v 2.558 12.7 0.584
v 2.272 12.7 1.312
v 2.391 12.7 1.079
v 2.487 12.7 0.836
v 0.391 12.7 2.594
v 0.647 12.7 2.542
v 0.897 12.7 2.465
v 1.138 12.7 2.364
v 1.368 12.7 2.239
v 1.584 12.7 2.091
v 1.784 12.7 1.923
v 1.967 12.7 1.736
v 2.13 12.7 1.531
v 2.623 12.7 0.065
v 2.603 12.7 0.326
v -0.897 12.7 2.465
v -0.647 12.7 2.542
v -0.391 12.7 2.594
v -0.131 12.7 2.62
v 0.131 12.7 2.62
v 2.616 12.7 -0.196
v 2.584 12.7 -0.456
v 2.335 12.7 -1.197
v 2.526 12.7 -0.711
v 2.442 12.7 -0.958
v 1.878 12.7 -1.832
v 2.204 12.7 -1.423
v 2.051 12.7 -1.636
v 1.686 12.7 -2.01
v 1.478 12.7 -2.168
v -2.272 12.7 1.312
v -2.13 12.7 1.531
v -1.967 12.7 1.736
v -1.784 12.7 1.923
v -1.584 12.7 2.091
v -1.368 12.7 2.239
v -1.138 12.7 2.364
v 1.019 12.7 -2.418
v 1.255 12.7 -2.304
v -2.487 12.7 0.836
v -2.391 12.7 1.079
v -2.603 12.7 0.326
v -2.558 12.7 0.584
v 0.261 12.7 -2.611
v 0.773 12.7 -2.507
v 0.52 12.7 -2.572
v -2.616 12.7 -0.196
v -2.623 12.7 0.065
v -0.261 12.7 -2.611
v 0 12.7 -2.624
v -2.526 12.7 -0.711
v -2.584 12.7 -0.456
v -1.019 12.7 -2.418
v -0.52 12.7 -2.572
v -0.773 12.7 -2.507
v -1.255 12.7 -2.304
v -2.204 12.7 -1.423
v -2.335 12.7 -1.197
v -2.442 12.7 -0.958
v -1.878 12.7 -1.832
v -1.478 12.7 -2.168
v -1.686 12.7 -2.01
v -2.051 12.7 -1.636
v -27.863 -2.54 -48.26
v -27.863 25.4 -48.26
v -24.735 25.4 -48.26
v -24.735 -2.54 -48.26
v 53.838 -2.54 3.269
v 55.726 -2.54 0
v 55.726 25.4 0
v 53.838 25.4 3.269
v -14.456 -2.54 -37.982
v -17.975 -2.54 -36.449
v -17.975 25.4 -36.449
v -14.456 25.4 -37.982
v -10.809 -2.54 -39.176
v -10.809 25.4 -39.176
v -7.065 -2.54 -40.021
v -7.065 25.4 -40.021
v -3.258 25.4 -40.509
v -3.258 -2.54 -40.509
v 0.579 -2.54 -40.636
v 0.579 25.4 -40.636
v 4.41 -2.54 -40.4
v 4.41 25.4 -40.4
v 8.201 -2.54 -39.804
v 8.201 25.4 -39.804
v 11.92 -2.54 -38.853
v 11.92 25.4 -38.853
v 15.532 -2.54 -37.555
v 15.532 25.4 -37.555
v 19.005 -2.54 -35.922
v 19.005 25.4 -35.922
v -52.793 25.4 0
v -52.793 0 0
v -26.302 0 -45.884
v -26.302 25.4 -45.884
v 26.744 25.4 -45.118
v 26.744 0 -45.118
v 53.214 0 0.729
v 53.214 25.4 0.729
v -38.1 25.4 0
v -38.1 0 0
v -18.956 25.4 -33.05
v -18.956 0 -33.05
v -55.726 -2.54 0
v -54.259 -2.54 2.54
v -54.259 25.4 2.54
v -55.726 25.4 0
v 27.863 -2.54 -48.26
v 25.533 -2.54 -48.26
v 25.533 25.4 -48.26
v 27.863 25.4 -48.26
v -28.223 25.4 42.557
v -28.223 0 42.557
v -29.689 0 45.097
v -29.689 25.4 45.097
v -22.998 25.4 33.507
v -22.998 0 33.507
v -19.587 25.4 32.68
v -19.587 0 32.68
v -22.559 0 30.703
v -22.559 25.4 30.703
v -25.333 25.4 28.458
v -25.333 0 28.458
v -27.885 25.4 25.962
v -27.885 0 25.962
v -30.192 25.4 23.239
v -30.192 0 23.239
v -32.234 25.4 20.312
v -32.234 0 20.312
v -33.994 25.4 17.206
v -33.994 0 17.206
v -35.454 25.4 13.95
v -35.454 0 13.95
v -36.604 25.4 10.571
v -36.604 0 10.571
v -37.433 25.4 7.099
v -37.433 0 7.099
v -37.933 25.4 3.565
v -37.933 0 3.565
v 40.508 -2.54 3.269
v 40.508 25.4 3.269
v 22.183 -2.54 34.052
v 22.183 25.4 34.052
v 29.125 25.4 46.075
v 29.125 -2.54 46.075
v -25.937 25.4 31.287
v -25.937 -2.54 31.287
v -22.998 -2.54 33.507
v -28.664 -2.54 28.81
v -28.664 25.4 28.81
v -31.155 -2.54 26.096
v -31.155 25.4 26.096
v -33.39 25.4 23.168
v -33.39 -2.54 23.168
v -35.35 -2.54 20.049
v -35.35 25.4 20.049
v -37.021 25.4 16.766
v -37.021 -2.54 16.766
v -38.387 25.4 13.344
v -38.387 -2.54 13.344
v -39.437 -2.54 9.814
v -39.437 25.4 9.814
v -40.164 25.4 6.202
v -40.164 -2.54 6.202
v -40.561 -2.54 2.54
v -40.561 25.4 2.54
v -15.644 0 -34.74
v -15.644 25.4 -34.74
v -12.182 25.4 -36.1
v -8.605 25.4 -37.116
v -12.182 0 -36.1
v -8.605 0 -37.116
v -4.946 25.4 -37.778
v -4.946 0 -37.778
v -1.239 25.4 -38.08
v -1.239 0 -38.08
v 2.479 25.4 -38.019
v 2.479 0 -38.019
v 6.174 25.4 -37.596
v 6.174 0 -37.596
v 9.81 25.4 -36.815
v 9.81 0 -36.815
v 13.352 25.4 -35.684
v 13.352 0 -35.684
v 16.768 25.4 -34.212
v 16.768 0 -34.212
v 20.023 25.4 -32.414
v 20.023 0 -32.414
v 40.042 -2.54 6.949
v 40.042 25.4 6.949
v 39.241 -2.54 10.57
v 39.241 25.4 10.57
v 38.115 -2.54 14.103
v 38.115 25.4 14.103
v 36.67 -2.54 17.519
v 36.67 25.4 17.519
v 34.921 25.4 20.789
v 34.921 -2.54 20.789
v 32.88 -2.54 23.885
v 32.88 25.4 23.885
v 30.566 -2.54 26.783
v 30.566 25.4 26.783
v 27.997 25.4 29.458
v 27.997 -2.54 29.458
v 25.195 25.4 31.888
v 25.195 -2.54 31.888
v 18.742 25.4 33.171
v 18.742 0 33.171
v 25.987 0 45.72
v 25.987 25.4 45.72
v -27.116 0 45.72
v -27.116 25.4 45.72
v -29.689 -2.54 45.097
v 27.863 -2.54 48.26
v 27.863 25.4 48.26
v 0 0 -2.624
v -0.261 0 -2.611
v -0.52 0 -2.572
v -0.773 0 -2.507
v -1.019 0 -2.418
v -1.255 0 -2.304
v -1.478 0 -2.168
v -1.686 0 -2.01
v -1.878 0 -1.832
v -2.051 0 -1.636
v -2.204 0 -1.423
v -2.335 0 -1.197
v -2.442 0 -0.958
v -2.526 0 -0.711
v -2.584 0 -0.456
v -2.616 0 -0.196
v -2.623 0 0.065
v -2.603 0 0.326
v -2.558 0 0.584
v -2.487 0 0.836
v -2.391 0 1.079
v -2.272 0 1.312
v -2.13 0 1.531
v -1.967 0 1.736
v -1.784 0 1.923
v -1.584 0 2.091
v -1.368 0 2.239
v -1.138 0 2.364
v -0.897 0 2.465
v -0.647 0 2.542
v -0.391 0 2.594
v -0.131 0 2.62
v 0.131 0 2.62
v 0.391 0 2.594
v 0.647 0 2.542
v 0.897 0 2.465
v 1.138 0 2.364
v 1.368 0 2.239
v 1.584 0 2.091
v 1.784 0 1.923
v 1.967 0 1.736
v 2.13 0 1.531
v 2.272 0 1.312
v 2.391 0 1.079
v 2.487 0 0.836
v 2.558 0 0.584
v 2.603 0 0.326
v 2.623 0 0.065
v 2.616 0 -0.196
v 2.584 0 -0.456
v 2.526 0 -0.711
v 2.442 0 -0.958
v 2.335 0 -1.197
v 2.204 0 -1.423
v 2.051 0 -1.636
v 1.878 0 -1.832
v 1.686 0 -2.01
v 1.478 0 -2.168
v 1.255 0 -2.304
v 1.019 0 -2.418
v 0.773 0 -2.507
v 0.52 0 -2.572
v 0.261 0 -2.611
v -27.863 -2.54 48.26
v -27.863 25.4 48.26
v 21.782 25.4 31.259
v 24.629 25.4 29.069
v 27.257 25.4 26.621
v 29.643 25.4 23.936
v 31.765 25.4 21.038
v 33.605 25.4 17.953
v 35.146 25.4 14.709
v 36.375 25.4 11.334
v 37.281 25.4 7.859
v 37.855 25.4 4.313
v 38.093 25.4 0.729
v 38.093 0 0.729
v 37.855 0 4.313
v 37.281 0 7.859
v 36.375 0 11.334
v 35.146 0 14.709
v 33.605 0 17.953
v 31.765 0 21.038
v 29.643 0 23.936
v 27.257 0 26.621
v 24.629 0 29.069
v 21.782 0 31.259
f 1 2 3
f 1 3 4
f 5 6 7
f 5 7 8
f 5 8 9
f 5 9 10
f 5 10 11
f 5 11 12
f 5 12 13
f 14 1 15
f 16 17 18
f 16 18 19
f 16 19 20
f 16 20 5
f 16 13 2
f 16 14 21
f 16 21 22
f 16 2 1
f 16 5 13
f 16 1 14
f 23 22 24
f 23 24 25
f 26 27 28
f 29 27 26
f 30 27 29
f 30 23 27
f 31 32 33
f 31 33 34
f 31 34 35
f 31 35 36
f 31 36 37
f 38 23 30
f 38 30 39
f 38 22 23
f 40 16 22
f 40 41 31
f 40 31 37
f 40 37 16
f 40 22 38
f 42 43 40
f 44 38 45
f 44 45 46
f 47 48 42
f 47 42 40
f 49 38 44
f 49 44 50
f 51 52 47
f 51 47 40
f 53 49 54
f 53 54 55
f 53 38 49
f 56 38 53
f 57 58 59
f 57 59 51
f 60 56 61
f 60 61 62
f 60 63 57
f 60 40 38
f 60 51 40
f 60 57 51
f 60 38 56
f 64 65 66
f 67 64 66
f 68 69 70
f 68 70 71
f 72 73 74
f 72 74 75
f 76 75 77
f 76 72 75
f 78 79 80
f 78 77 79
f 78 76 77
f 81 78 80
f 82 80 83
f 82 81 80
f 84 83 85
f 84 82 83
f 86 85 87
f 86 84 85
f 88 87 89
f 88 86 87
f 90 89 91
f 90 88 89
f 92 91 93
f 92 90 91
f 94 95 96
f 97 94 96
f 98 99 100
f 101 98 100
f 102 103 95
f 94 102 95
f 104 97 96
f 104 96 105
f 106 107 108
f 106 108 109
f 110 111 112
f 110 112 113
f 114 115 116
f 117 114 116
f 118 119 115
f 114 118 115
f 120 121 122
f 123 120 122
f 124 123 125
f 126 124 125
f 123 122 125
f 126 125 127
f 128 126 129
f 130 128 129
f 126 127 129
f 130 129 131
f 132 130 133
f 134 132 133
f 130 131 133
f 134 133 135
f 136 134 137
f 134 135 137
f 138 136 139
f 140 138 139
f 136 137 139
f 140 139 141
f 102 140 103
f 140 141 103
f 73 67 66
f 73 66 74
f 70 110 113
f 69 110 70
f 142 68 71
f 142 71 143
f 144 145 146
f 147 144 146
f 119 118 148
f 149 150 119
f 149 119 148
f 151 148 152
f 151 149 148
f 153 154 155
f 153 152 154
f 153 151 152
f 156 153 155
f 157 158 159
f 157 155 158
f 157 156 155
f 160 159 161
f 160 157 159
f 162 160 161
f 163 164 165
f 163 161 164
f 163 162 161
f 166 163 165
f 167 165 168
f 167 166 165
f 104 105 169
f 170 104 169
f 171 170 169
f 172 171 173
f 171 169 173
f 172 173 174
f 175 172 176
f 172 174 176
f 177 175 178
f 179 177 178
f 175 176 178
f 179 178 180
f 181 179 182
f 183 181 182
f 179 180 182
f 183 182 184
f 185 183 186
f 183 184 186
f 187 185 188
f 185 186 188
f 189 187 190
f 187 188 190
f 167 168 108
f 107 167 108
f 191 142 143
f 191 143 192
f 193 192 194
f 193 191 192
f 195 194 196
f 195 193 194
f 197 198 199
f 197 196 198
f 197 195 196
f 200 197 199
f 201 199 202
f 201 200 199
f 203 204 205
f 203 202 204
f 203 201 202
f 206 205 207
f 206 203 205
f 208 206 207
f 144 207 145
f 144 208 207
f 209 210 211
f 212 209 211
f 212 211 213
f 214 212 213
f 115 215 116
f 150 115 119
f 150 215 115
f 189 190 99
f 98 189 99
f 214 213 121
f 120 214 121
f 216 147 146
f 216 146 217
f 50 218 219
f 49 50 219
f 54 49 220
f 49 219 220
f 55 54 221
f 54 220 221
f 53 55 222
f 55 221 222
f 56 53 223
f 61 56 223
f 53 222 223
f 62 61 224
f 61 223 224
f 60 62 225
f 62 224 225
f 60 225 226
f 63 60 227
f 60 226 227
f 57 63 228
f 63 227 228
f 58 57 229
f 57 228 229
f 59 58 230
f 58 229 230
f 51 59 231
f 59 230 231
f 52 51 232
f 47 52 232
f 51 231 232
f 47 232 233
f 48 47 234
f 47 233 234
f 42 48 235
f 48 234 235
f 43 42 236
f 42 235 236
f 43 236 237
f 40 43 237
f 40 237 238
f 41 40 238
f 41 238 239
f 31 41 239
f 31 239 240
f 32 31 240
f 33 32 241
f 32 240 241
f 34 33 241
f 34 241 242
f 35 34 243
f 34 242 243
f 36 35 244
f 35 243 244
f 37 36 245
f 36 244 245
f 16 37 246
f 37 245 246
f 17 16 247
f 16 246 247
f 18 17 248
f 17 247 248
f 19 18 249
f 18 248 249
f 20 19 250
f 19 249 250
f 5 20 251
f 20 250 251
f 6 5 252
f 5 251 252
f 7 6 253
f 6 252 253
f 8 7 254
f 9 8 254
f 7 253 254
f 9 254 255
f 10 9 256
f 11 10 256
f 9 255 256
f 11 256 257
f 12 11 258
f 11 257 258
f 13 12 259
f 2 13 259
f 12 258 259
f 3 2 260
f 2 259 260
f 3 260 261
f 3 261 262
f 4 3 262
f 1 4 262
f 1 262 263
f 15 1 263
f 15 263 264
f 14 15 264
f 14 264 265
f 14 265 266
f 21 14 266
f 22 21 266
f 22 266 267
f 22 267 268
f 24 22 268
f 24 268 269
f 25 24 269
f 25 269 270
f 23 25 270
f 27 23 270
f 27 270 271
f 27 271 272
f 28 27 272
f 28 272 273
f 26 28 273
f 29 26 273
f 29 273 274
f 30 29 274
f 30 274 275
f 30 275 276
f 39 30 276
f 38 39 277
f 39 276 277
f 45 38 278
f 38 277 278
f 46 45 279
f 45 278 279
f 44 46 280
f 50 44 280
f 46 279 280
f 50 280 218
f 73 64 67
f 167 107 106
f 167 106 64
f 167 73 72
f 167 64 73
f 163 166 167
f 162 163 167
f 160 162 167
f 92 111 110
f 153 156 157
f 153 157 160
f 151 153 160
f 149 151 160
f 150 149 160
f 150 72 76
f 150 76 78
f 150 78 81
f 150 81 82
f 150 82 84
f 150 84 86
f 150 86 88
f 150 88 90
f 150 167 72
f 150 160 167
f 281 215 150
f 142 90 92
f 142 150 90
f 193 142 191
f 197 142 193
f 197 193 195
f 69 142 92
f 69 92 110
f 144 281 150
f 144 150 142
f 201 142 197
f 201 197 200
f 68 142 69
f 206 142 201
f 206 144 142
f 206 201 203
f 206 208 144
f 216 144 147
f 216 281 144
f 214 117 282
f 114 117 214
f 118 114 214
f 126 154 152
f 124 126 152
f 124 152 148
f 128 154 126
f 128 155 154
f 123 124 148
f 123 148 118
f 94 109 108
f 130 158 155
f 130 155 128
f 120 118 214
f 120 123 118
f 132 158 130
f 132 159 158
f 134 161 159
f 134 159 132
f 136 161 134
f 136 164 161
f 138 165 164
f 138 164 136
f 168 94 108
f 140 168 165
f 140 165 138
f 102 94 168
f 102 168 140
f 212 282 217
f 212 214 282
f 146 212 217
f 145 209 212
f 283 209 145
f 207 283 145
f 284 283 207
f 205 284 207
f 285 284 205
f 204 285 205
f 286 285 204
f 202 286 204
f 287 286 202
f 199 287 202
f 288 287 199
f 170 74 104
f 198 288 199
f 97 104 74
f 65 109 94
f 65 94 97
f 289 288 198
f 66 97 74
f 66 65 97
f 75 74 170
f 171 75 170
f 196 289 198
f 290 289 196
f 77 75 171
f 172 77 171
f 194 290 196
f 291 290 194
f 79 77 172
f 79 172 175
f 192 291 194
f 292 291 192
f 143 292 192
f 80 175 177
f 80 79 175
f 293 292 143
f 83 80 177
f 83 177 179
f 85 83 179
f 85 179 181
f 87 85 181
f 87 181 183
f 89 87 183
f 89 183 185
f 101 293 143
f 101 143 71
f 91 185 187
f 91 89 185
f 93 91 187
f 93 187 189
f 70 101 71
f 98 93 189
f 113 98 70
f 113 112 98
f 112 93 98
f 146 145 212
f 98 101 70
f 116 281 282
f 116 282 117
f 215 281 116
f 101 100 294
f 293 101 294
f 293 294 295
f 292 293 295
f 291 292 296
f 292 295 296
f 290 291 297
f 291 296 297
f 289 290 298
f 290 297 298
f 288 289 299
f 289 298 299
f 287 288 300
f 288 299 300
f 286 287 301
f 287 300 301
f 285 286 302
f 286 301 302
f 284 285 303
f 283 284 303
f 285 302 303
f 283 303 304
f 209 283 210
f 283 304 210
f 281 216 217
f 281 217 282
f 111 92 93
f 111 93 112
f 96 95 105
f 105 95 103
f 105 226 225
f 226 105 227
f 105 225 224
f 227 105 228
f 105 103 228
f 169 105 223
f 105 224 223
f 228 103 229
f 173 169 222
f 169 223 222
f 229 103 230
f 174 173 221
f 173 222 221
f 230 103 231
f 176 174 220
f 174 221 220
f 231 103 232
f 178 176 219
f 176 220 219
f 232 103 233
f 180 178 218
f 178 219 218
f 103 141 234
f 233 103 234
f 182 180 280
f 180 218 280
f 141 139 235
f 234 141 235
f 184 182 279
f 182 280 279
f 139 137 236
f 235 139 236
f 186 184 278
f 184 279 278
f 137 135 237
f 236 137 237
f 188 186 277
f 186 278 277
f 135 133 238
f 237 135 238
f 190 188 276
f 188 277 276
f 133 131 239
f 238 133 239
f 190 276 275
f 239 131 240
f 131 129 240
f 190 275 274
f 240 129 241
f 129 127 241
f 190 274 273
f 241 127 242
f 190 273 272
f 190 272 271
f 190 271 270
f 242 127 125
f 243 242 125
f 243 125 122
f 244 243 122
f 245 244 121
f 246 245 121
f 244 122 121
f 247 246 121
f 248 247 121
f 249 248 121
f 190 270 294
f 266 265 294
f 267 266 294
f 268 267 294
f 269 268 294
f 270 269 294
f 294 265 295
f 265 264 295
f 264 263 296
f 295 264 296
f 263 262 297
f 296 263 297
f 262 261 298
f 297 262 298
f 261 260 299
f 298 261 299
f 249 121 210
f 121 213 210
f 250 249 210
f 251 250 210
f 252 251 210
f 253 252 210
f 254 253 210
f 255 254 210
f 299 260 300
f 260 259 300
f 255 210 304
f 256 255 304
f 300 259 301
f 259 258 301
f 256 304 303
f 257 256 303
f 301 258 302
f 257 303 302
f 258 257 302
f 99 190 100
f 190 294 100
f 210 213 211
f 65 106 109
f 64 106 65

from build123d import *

# Parameters (mm, degrees)
EXTRUDE_2_DEPTH = 25.4
EXTRUDE_START   = 2.54
EXTRUDE_4_DEPTH = 2.54
SKETCH_4_R      = 2.623574207
EXTRUDE_5_DEPTH = 12.7


with BuildPart() as part:
    # 草图2 → 凸台-拉伸2 (new body)
    with BuildSketch(Plane(origin=(0, 0, 0), x_dir=(1, 0, 0), z_dir=(0, 1, 0))):
        with BuildLine():
            Line((27.862923991, 48.26), (25.533011104, 48.26))
            Line((25.533011104, 48.26), (19.005421019, 35.922187738))
            ThreePointArc((19.005421019, 35.922187738), (0.578570421, 40.635881389), (-17.97500995, 36.448712149))
            Line((-17.97500995, 36.448712149), (-24.735061671, 48.26))
            Line((-24.735061671, 48.26), (-27.862923991, 48.26))
            Line((-27.862923991, 48.26), (-55.725847982, 0))
            Line((-55.725847982, 0), (-54.259378298, -2.54))
            Line((-54.259378298, -2.54), (-40.560547334, -2.54))
            ThreePointArc((-40.560547334, -2.54), (-35.350417354, -20.048880091), (-22.997765154, -33.50690075))
            Line((-22.997765154, -33.50690075), (-28.222727801, -42.556801521))
            Line((-28.222727801, -42.556801521), (-29.689197484, -45.096801521))
            Line((-29.689197484, -45.096801521), (-27.862923991, -48.26))
            Line((-27.862923991, -48.26), (27.862923991, -48.26))
            Line((27.862923991, -48.26), (29.124677573, -46.07457869))
            Line((29.124677573, -46.07457869), (22.183228773, -34.051636689))
            ThreePointArc((22.183228773, -34.051636689), (34.920508786, -20.78864272), (40.508274586, -3.269447975))
            Line((40.508274586, -3.269447975), (53.838231313, -3.269447975))
            Line((53.838231313, -3.269447975), (55.725847982, 0))
            Line((55.725847982, 0), (27.862923991, 48.26))
        make_face()
        with BuildLine():
            Line((-26.301774892, 45.883989559), (-18.95614877, 33.049575244))
            ThreePointArc((-18.95614877, 33.049575244), (0.620872136, 38.094940842), (20.02308022, 32.414290961))
            Line((20.02308022, 32.414290961), (26.744142761, 45.117785934))
            Line((26.744142761, 45.117785934), (53.2140556, -0.729447975))
            Line((53.2140556, -0.729447975), (38.093016495, -0.729447975))
            ThreePointArc((38.093016495, -0.729447975), (32.721218848, -19.517475172), (18.742100855, -33.171428301))
            Line((18.742100855, -33.171428301), (25.987022104, -45.72))
            Line((25.987022104, -45.72), (-27.116061926, -45.72))
            Line((-27.116061926, -45.72), (-19.587157143, -32.679554389))
            ThreePointArc((-19.587157143, -32.679554389), (-33.150269133, -18.779500963), (-38.1, 0))
            Line((-38.1, 0), (-52.792908615, 0))
            Line((-52.792908615, 0), (-26.301774892, 45.883989559))
        make_face(mode=Mode.SUBTRACT)
    extrude(amount=EXTRUDE_2_DEPTH)

    # 草图3 → 凸台-拉伸4 (add)
    with BuildSketch(Plane.XZ.offset(EXTRUDE_START)):
        with BuildLine():
            Line((22.183228773, 34.051636689), (29.124677573, 46.07457869))
            Line((29.124677573, 46.07457869), (27.862923991, 48.26))
            Line((27.862923991, 48.26), (-27.862923991, 48.26))
            Line((-27.862923991, 48.26), (-29.689197484, 45.096801521))
            Line((-29.689197484, 45.096801521), (-22.997765154, 33.50690075))
            ThreePointArc((-22.997765154, 33.50690075), (-35.350417354, 20.048880091), (-40.560547334, 2.54))
            Line((-40.560547334, 2.54), (-54.259378298, 2.54))
            Line((-54.259378298, 2.54), (-55.725847982, 0))
            Line((-55.725847982, 0), (-27.862923991, -48.26))
            Line((-27.862923991, -48.26), (-24.735061671, -48.26))
            Line((-24.735061671, -48.26), (-17.97500995, -36.448712149))
            ThreePointArc((-17.97500995, -36.448712149), (0.578570421, -40.635881389), (19.005421019, -35.922187738))
            Line((19.005421019, -35.922187738), (25.533011104, -48.26))
            Line((25.533011104, -48.26), (27.862923991, -48.26))
            Line((27.862923991, -48.26), (55.725847982, 0))
            Line((55.725847982, 0), (53.838231313, 3.269447975))
            Line((53.838231313, 3.269447975), (40.508274586, 3.269447975))
            ThreePointArc((40.508274586, 3.269447975), (34.920508786, 20.78864272), (22.183228773, 34.051636689))
        make_face()
    extrude(amount=-EXTRUDE_4_DEPTH)

    # 草图4 → 凸台-拉伸5 (add)
    with BuildSketch(Plane(origin=(0, 0, 0), x_dir=(1, 0, 0), z_dir=(0, 1, 0))):
        with Locations(Location((0, 0, 0), (0, 0, 90))):
            Circle(SKETCH_4_R)
    extrude(amount=EXTRUDE_5_DEPTH)


solid = part.part
